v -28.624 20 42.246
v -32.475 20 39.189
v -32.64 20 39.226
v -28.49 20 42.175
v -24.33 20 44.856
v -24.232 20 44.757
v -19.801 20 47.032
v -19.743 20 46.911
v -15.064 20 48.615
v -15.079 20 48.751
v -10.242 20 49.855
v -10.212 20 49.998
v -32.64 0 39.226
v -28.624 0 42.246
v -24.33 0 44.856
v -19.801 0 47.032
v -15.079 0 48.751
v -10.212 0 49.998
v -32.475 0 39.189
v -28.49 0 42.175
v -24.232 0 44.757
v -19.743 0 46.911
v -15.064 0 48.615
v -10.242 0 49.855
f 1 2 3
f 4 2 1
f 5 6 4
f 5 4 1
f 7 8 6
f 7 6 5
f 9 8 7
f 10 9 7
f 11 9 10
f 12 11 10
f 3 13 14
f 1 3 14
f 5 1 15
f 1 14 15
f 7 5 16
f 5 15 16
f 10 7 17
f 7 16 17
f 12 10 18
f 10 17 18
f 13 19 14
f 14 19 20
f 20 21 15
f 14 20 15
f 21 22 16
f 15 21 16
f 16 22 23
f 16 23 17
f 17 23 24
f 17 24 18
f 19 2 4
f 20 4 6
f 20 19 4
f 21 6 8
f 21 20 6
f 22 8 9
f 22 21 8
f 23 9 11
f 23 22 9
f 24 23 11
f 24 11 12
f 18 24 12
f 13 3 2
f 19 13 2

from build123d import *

# Parameters (mm, degrees)
SKETCH1_R           = 51.029755332
SKETCH1_R_2         = 50.895830663
BOSS_EXTRUDE1_DEPTH = 20
CUT_EXTRUDE1_DEPTH  = 50
CUT_EXTRUDE3_DEPTH  = 50
CUT_EXTRUDE4_DEPTH  = 50


with BuildPart() as part:
    # Sketch1 → Boss-Extrude1 (new body)
    with BuildSketch(Plane(origin=(0, 0, 0), x_dir=(1, 0, 0), z_dir=(0, 1, 0))):
        with Locations(Location((0, 0, 0), (0, 0, 270))):
            Circle(SKETCH1_R)
        with Locations(Location((0, 0, 0), (0, 0, 270))):
            Circle(SKETCH1_R_2, mode=Mode.SUBTRACT)
    extrude(amount=BOSS_EXTRUDE1_DEPTH)

    # Sketch2 → Cut-Extrude1 (cut)
    with BuildSketch(Plane(origin=(0, 0, 0), x_dir=(1, 0, 0), z_dir=(0, 1, 0))):
        with BuildLine():
            add(Edge.make_bspline(
                [(-34.904731033, -39.559214609), (-30.458455569, -39.265509231), (-8.75106143, -27.58858136), (20.545320777, -14.807136755), (86.675168203, -3.797801784), (38.172145901, 77.469799439), (-39.909980954, 55.809798543), (-65.468102513, 4.660444989), (-50.700851491, -40.602650978), (-34.904731033, -39.559214609)],
                knots=[0, 0, 0, 0, 0.04430768, 0.194241153, 0.328566983, 0.483905616, 0.753189396, 0.842589722, 1, 1, 1, 1], degree=3))
        make_face()
    extrude(amount=CUT_EXTRUDE1_DEPTH, mode=Mode.SUBTRACT)

    # Sketch3 → Cut-Extrude3 (cut)
    with BuildSketch(Plane(origin=(0, 0, 0), x_dir=(1, 0, 0), z_dir=(0, 1, 0))):
        with BuildLine():
            add(Edge.make_bspline(
                [(15.246268895, -30.627230393), (8.812696929, -41.78541341), (-4.179204183, -74.113546423), (71.751860115, -51.38349092), (57.353322601, 23.43159241), (26.480816992, -11.142386759), (15.246268895, -30.627230393)],
                knots=[0, 0, 0, 0, 0.165808592, 0.474148196, 0.71045873, 1, 1, 1, 1], degree=3))
        make_face()
    extrude(amount=CUT_EXTRUDE3_DEPTH, mode=Mode.SUBTRACT)

    # Sketch4 → Cut-Extrude4 (cut)
    with BuildSketch(Plane(origin=(0, 0, 0), x_dir=(1, 0, 0), z_dir=(0, 1, 0))):
        with BuildLine():
            add(Edge.make_bspline(
                [(-9.67297834, -44.564169781), (-11.510509193, -47.228479243), (-7.545033393, -65.726006155), (26.778755679, -53.527914946), (4.528101436, -45.351564648), (-7.606259285, -41.56755118), (-9.67297834, -44.564169781)],
                knots=[0, 0, 0, 0, 0.198613527, 0.560569713, 0.776614167, 1, 1, 1, 1], degree=3))
        make_face()
    extrude(amount=CUT_EXTRUDE4_DEPTH, mode=Mode.SUBTRACT)


solid = part.part
